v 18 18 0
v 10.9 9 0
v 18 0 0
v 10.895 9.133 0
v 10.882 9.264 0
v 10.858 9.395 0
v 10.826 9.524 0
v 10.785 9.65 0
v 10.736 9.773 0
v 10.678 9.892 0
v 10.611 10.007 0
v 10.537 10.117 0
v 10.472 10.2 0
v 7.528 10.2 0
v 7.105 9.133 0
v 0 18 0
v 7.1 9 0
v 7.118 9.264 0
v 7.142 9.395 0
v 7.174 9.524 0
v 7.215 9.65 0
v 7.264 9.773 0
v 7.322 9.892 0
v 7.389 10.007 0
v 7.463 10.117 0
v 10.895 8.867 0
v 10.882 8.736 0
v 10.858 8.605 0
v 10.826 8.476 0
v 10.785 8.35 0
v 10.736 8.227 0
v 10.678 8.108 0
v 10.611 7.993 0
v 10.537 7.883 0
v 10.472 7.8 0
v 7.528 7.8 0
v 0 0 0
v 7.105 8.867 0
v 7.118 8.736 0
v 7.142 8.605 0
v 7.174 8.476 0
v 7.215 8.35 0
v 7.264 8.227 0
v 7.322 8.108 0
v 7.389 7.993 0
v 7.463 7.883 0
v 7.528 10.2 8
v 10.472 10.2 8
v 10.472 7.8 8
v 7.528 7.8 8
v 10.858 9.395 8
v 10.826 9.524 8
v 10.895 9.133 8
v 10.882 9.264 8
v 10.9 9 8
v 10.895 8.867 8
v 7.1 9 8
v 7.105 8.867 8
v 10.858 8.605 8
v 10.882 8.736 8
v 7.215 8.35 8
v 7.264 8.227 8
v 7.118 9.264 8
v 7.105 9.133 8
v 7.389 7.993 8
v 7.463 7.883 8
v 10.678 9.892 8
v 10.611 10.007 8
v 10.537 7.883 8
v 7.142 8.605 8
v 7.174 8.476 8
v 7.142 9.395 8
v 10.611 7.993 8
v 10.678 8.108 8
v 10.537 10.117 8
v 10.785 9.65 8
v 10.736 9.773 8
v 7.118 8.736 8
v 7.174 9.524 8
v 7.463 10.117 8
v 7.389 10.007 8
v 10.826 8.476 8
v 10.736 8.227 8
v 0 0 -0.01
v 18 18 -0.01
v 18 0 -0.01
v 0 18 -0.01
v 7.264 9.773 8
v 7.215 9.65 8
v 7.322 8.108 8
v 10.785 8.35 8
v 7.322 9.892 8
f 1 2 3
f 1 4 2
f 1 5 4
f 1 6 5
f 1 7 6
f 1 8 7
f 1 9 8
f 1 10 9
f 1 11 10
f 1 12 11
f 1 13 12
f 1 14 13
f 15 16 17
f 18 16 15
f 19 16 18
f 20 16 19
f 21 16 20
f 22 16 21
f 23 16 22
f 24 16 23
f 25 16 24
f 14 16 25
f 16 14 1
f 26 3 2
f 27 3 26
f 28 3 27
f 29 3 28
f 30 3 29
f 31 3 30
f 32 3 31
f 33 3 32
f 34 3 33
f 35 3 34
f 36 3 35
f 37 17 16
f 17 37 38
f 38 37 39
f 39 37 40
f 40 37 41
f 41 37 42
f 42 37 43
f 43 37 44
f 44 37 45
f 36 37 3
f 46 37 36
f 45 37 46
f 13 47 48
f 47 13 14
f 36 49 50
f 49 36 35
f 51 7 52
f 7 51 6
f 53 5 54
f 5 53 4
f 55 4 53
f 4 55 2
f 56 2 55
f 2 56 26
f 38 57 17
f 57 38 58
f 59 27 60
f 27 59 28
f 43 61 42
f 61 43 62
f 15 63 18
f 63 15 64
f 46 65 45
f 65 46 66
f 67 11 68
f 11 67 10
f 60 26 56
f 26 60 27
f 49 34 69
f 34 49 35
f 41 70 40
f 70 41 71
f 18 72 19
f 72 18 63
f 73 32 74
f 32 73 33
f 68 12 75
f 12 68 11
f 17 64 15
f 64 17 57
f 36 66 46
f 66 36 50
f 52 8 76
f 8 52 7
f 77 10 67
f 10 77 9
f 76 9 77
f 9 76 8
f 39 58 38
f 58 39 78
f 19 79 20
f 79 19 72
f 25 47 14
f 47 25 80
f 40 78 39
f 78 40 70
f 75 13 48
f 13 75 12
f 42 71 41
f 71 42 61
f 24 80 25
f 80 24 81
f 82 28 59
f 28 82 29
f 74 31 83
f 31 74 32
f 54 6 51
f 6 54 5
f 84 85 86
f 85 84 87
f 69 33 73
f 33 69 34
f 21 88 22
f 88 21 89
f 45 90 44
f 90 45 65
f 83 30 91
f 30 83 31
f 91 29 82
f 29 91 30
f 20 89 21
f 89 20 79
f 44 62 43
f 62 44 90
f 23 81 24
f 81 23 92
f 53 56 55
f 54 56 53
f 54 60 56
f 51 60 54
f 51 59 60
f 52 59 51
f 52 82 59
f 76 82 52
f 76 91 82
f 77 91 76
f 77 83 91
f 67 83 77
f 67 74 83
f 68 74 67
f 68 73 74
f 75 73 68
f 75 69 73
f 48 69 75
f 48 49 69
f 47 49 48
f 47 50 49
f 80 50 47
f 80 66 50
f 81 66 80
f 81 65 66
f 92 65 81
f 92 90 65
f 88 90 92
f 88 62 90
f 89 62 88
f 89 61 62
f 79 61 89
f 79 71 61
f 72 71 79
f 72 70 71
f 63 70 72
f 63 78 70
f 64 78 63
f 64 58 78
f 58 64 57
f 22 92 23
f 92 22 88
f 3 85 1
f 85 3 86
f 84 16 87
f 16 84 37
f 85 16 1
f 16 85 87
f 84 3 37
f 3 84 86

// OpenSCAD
// file: ../Base/PlacementOptions.scad
// Fischertechnik Box Foundation
// Placement Options

// Alignment
NoAlign = 0;
AlignLeft = 1;
AlignBottom = 2;
AlignCenter = 3;
AlignRight = 4;
AlignTop = 5;

// Element rotation degree steps
rotations = [0, -90, -180, -270];

// Rotation
NoRotation = 0;
Rotate0 = 0;
Rotate90 = 1;
Rotate180 = 2;
Rotate270 = 3;

// Docking (seen from above)
NoDock = -1;
DockLeft = 0;
DockTop = 1;
DockRight = 2;
DockCorner = 2;
DockBottom = 3;

// Web corners
LowerLeft = 0;
UpperLeft = 1;
UpperRight = 2;
LowerRight = 3;

// Web position relative to corner
LeftOfCorner = 0;
RightOfCorner = 1;

// Rails direction
Horizontal = true;
Vertical = false;
// file: ../Base/Boxes.scad
// Fischertechnik Box Foundation
// Pre-designed Boxes

use <Constants.scad>

include <PlacementOptions.scad>

box190Width = 190;
box190Depth = 130;
box130Width = 130;
box130Depth = 95;

// Values are from an original ec3 box
topBottomDifference = 1.5;
outerHeight = 40;
baseThickness = 1.8;
innerHeight = outerHeight - baseThickness;
stackExcess = 5.7;
radius = 3.5;
wallThickness = 1.5;
tolerance = 0.2;

boxWallThickness = wallThickness;
boxBaseThickness = baseThickness;
boxWebWidth = 3.0;

// getBoxWallThickness()
// Gets the wall thickness of a Fischertechnik Box
function getBoxWallThickness() = boxWallThickness;

// getBoxUsageHeight(height = 38.2)
// Gets the usable height of a Fischertechnik box
// height = Outer height of the box from the bottom to the upper edge.
function getBoxUsageHeight(height = outerHeight) = height - baseThickness - stackExcess;

// getBoxInnerHeight()
// Gets the inner height of a Fischertechnik box, including the stack excess
function getBoxInnerHeight() = innerHeight;

// getBoxBaseThickness()
// Gets the thickness of the Fischertechnik box base.
function getBoxBaseThickness() = boxBaseThickness;

// getBoxWebWidth()
// Gets the width of a box web
function getBoxWebWidth() = boxWebWidth;

// getBox190Space()
// Gets the usable inner space of a Box 190 as an x/y-list
function getBox190Space() = [
    box190Width - 2*getBoxWallThickness() - topBottomDifference, 
    box190Depth - 2*getBoxWallThickness() - topBottomDifference ];

// RoundedCornerPlate(width, depth, height, radius)
// Creates a body plate with rounded corners for a box. Used
// also to create the complete box with the hull module.
// width = Width of the plate
// depth = depth of the plate 
// height = thickness of the plate
// radius = radius of the rounded corner
module RoundedCornerPlate(width, depth, height, radius) {
    translate([radius, radius])
    hull() {
        w = width-2*radius;
        d = depth-2*radius;
        cube([w, d, height]);
        cylinder(height, r=radius, $fn=getFragments());
        translate([w, 0])
            cylinder(height, r=radius, $fn=getFragments());
        translate([w, d])
            cylinder(height, r=radius, $fn=getFragments());
        translate([0, d])
            cylinder(height, r=radius, $fn=getFragments());
    }
}

// BoxBase(width, depth)
// Creates an empty stackable Fischertechnik compatible box
// width = Outer width of the box (190, 130, ...)
// depth = Outer depth of the box (130, 95, ...)

module BoxBase(width, depth, height=outerHeight) {    
    thinPlate = 0.01;

    innerHeight = height - baseThickness;    
    
    module Body(tolerance=tolerance) {
        hull() {
            // Bottom with tolerance to fit into the original boxes when stacked
            translate([-wallThickness+tolerance, -wallThickness+tolerance, -baseThickness])
                RoundedCornerPlate(width-topBottomDifference-2*tolerance, depth-topBottomDifference-2*tolerance, thinPlate, radius);
            
            // Top
            translate([-wallThickness-topBottomDifference/2, -wallThickness-topBottomDifference/2, innerHeight-thinPlate])
                RoundedCornerPlate(width, depth, thinPlate, radius);
         }
    }

    module Cutoff() {
        hull() {
            coWidth = width - 2*wallThickness;
            coDepth = depth - 2*wallThickness;
            
            // Bottom
            RoundedCornerPlate(coWidth-topBottomDifference, coDepth-topBottomDifference, thinPlate, radius);

            // Top
            translate([-topBottomDifference/2, -topBottomDifference/2, innerHeight+thinPlate]) 
                RoundedCornerPlate(coWidth, coDepth, thinPlate, radius);
        }
    }
    
    difference() {        
        Body();
        Cutoff();
        stackOffset = innerHeight - stackExcess;
        translate([0, 0, stackOffset + baseThickness])
            Body(tolerance=0);
    }
}

// Creates the Fischertechnik empty box 130x190 mm and places it at position 0,0
// 190x130 are the outer sizes, the inner space is slightly smaller. Use getBox190Space() to get the inner sizes.
// The box is positioned that the usable inner space is at the 0,0,0 position.

module Box190() {
    BoxBase(box190Width, box190Depth);
}

// Gets the usable inner space of a Box 130 as an x/y-list
function getBox130Space() = [
    box130Width - 2*getBoxWallThickness() - topBottomDifference, 
    box130Depth - 2*getBoxWallThickness() - topBottomDifference ];

// Creates the Fischertechnik empty box 95x130 mm and places it at position 0,0
// 190x130 are the outer sizes, the inner space is slightly smaller. Use getBox190Space() to get the inner sizes.
// The box is positioned that the usable inner space is at the 0,0,0 position.

module Box130() {
    BoxBase(box130Width, box130Depth);
}

// Creates a web at the specified box walls
// corner 0 = LowerLeft, 1 = UpperLeft, 2 = UpperRight, 3 = LowerRight
// side 0 = LeftOfCorner, 1 = RightOfCorner
// distance = Distance in mm from the corner
// boxSpace = inner width and depth of the box (default: Box 190)
// webWidth = length of the web (default is 3 mms)
// webThickness = thickness of the web (default is 1 mm)
// height = Height of the web (standard is getBoxUsageHeight())
// sink = How much of the web is sunk into the wall

module BoxWeb(
    corner, 
    side, 
    distance, 
    boxSpace=getBox190Space(), 
    webWidth=getBoxWebWidth(), 
    webThickness=1.0, 
    height=getBoxUsageHeight(),
    sink = getBoxWallThickness()/2) {
    width = (corner % 2 == 0) ? 
            (side == LeftOfCorner ? webWidth : webThickness) :
            (side == LeftOfCorner ? webThickness : webWidth);

    depth = (corner % 2 == 0) ? 
            (side == RightOfCorner ? webWidth : webThickness) :
            (side == RightOfCorner ? webThickness : webWidth);
    
    xDiff = corner == LowerLeft ? 
                (side == LeftOfCorner ? -sink : distance) :
            (corner == UpperLeft ?                
                (side == LeftOfCorner ? distance : -sink) :
            (corner == UpperRight ?
                (side == LeftOfCorner ? boxSpace.x-webWidth+sink : boxSpace.x-distance-webThickness) :
                (side == LeftOfCorner ? boxSpace.x-distance-webThickness: boxSpace.x-webWidth+sink)));

    yDiff = corner == LowerLeft ? 
                (side == RightOfCorner ? -sink : distance) :
            (corner == UpperLeft ?
                (side == RightOfCorner ? boxSpace.y-distance-webThickness : boxSpace.y-webWidth+sink) :
            (corner == UpperRight ?
                (side == RightOfCorner ? boxSpace.y-webWidth+sink : boxSpace.y-distance-webThickness) :
                (side == RightOfCorner ? distance : -sink)));
    
    translate([xDiff, yDiff, -getExcess()])
        cube([width, depth, height + 2*getExcess()]);
}
// file: ../Base/Rotation.scad
// Fischertechnik Box Foundation
// Geometry Helpers Rotation

include <PlacementOptions.scad>

// getRotatedSpace(space, rotation=NoRotation)
// Rotates the space dependent on the specified rotation

function getRotatedSpace(space, rotation=NoRotation) = [
    (rotation == Rotate90 || rotation == Rotate270) ? space.y : space.x,
    (rotation == Rotate90 || rotation == Rotate270) ? space.x : space.y
];

// Rotates the given space around the fixed left lower corner
// space = the space the children needs as width/depth list [width,depth]
// rotation = 0 Rotate0 degrees, 1 Rotate90 degrees, 2 Rotate180 degrees, 3 Rotate270 degrees (equivalent to -90)

module RotateFix(space, rotation=NoRotation) {
    dy = (rotation == Rotate0 || rotation == Rotate270) ? 0 :
        (rotation == Rotate90) ? space.x :
        space.y;
    dx = (rotation < Rotate180) ? 0 :
        (rotation == Rotate180) ? space.x :
        space.y;
    
    translate([dx, dy, 0])
        rotate([0, 0, rotations[rotation]])
            children();
}
// file: ../Base/Alignment.scad
// Fischertechnik Box Foundation
// Geometry Helpers Alignment

include <PlacementOptions.scad>

// getAlignedX(elementWidth, spaceWidth, align=AlignRight, offset=0)
// Gets the aligned X offset of an element with the given
// width in the given space.
// elementWidth = The width of the element to positon
// spaceWidth = The space where the element should be aligned
// align = 0 AlignLeft, 1 AlignCenter, 2 AlignRight
// offset = an optional offset from the aligned position. When
// aligned left or centered, then positive values are in X direction.
// When aligned right then positive values are in negative X direction.

function getAlignedX(elementWidth, spaceWidth, align=AlignRight, offset=0) =
    (align == AlignLeft) ?
        offset :
        ((align == AlignCenter) ?
        (spaceWidth - elementWidth)/2 + offset :
        spaceWidth - offset - elementWidth);

// getAlignedY(elementDepth, spaceDepth, align=AlignTop, offset=0)
// Gets the aligned Y offset of an element with the given
// depth in the given space.
// elementDepth = The depth of the element to positon
// spaceDepth = The space where the element should be aligned
// align = 0 AlignBottom, 1 AlignCenter, 2 AlignTop
// offset = an optional offset from the aligned position. When
// aligned bottom or centered, then positive values are in Y direction.
// When aligned top then positive values are in negative Y direction.

function getAlignedY(elementDepth, spaceDepth, align=AlignTop, offset=0) =
    (align == AlignBottom) ?
        offset :
        ((align == AlignCenter) ?
        (spaceDepth - elementDepth)/2 + offset :
        spaceDepth - offset - elementDepth);
// file: ../Base/Constants.scad
// Fischertechnik Box Foundation
// Constants

// Constant values necessary for multiple elements

// Base constants
dividerThickness = 1.2;
excess = 0.01;
fragments = 90;
tolerance = 0.8;

// Gets the thickness of a divider 
function getDividerThickness() = dividerThickness;

// Gets the excess that is used to merge walls into each other
function getExcess() = excess;

// Gets amount of fragments of a cylinder
function getFragments() = fragments;

// Gets the inner tolerance of a frame to each side
function getTolerance() = tolerance;


// Fischertechnik specific constants
axisDiameter = 4;
axisBottomDiameter = axisDiameter + 1;
axisTolerance = 0.2;
axisLockingLength = 8;

// Gets axis diameter of Fischertechnik axis
function getAxisDiameter() = axisDiameter;

// Gets axis diameter tolerance (subtracted for element axis)
function getAxisTolerance() = axisTolerance;

// Gets the axis diameter for standing axis
function getStandAxisDiameter() = getAxisDiameter() - getAxisTolerance();

// Gets axis bottom diameter for thicker part at the bottom
function getAxisBottomDiameter() = axisBottomDiameter;

// Gets the lengthh of the locking part of a locking axis
function getAxisLockingLength() = axisLockingLength;

pinHeight = 2.5;
pinTolerance = 0.2;

// gets the height of a connecting pin
function getPinHeight() = pinHeight;

// gets the connecting pin height tolerance
function getPinTolerance() = pinTolerance;

standardEdgeDistance = 2.5;
standardWebDistance = 11.5;
standardCornerLength = 15;

// gets the standard distance to the wall of the box for dockable frames with webs
function getStandardEdgeDistance() = standardEdgeDistance;

// gets the standard distance of each web to the corner of the dockable frame
function getStandardWebDistance() = standardWebDistance;

// gets the standard length of the corner walls of a dockable frame
function getStandardCornerLength() = standardCornerLength;

tubeWallFactor = 0.8;

// gets the wall thickness of a tube.
function getTubeWallThickness() = tubeWallFactor * getDividerThickness();

smallPartsFrameHeight = 20;

// gets the frame height for docked small parts boxes.
function getSmallPartsFrameHeight() = smallPartsFrameHeight;

hubRingDiameter = 19.5;
hubRingLevelDiameter = 21;

// gets the diameter of a tube matching the inner ring of a wheel
function getHubRingDiameter() = hubRingDiameter;

// gets the diameter of a hub tube with a thicker diameter
function getHubRingLevelDiameter() = hubRingLevelDiameter;
// file: ../Base/Placement.scad
// Fischertechnik Box Foundation
// Geometry Helpers Placement

use <Constants.scad>
use <Alignment.scad>
use <Rotation.scad>
use <Boxes.scad>

include <PlacementOptions.scad>

// Place(x=0, y=0, elementSpace=[0,0], alignX=AlignLeft, alignY=AlignBottom, rotation=Rotate0, boxSpace=getBox190Space())
// Places the child at the specified position
// y = Y-Position. This is a relative position when an X aligment is specified.
// x = X-Position. This is a relative position when an Y aligment is specified.
// elementSpace = space of the element to be placed [x,y]
// alignX = -1=NoAlign, 0 AlignLeft, 1 AlignCenter, 3 AlignRight (elementSpace and boxSpace required!)
// alignY = -1=NoAlign, 2 AlignBottom, 1 AlignCenter, 4 AlignTop (elementSpace and boxSpace required!)
// rotation = 0 Rotate0 0 degrees, 1 Rotate90 90 degrees, 
// 2 Rotate180 180 degrees, 3 Rotate270 270 degrees (equivalent to -90)
// boxSpace = Inner space of the box where the placement occurs [x,y] - default is Box 190x130 inner space

module Place(x=0, y=0, elementSpace=[0,0], 
  alignX=AlignLeft, alignY=AlignBottom, 
  rotation=NoRotation, boxSpace=getBox190Space()) {

    module Position(x, y, space, rotation=Rotate0) {
        translate([x, y, 0])
            RotateFix(space, rotation)
                children();
    }

    space = getRotatedSpace(elementSpace, rotation);
    alignedX = getAlignedX(space.x, boxSpace.x, alignX, x);
    alignedY = getAlignedY(space.y, boxSpace.y, alignY, y);
    Position(alignedX, alignedY, elementSpace, rotation)
        children();
}

// Center(space=getBox130Space(), elementSpace=[0,0])
// space = Space where the children is centered. For cylinder use centered=true and no elementSpace.
// elementSpace = space of the element to be centered [x,y]

module Center(space=getBox190Space(), elementSpace=[0,0]) {
    Place(elementSpace=elementSpace, boxSpace=space, alignX=AlignCenter, alignY=AlignCenter)
        children();
}

// CenterHorizontal(width=0, y=0, offset=0, space=getBox130Space())
// width = Width of the element to be placed.
// y = Y position of the element
// offset = Offset from the center position (negative will be left of the center)
// space = Space where the element is placed

module CenterHorizontal(width=0, y=0, offset=0, space=getBox190Space()) {
    Place(x=offset, y=y, elementSpace=[width, 0], boxSpace=space, alignX=AlignCenter)
        children(0);
}

// CenterVertical(depth=0, x=0, offset=0, space=getBox130Space())
// depth = Depth of the element to be placed.
// x = X position of the element
// offset = Offset from the center position (negative will be down of the center)
// space = Space where the element is placed

module CenterVertical(depth=0, x=0, offset=0, space=getBox190Space()) {
    Place(x=x, y=offset, elementSpace=[0, depth], boxSpace=space, alignY=AlignCenter)
        children(0);
}

// getIsVertical(align)
// True if the specified alignment needs a vertical orientation for a divider (AlignRight, AlignLeft)

function getIsVertical(align) = (align == AlignRight || align == AlignLeft);

// getIsHorizontal(align)
// True if the specified alignment needs a horizontal orientation for a divider (AlignTop, AlignBottom)

function getIsHorizontal(align) = (align == AlignTop || align == AlignBottom);
// main file
// Fischertechnik Box Library
// Axis for Locking Gear 10
// 35945

use <../Base/Placement.scad>
use <../ModelBase/Simple.scad>

/* [Hidden] */
width = 18;
depth = 18;

// getAxisLockingGear10Space()
// Gets the space the locking gear 10 needs

function getAxisLockingGear10Space() = [width, depth];

// AxisLockingGear10()
// Standing locking axis for locking gear 10.

module AxisLockingGear10() {
    space = [width, depth];
    Space(space);
    Center(space)
        LockingAxis();
}

// Tests
color("lightgray")
AxisLockingGear10();
